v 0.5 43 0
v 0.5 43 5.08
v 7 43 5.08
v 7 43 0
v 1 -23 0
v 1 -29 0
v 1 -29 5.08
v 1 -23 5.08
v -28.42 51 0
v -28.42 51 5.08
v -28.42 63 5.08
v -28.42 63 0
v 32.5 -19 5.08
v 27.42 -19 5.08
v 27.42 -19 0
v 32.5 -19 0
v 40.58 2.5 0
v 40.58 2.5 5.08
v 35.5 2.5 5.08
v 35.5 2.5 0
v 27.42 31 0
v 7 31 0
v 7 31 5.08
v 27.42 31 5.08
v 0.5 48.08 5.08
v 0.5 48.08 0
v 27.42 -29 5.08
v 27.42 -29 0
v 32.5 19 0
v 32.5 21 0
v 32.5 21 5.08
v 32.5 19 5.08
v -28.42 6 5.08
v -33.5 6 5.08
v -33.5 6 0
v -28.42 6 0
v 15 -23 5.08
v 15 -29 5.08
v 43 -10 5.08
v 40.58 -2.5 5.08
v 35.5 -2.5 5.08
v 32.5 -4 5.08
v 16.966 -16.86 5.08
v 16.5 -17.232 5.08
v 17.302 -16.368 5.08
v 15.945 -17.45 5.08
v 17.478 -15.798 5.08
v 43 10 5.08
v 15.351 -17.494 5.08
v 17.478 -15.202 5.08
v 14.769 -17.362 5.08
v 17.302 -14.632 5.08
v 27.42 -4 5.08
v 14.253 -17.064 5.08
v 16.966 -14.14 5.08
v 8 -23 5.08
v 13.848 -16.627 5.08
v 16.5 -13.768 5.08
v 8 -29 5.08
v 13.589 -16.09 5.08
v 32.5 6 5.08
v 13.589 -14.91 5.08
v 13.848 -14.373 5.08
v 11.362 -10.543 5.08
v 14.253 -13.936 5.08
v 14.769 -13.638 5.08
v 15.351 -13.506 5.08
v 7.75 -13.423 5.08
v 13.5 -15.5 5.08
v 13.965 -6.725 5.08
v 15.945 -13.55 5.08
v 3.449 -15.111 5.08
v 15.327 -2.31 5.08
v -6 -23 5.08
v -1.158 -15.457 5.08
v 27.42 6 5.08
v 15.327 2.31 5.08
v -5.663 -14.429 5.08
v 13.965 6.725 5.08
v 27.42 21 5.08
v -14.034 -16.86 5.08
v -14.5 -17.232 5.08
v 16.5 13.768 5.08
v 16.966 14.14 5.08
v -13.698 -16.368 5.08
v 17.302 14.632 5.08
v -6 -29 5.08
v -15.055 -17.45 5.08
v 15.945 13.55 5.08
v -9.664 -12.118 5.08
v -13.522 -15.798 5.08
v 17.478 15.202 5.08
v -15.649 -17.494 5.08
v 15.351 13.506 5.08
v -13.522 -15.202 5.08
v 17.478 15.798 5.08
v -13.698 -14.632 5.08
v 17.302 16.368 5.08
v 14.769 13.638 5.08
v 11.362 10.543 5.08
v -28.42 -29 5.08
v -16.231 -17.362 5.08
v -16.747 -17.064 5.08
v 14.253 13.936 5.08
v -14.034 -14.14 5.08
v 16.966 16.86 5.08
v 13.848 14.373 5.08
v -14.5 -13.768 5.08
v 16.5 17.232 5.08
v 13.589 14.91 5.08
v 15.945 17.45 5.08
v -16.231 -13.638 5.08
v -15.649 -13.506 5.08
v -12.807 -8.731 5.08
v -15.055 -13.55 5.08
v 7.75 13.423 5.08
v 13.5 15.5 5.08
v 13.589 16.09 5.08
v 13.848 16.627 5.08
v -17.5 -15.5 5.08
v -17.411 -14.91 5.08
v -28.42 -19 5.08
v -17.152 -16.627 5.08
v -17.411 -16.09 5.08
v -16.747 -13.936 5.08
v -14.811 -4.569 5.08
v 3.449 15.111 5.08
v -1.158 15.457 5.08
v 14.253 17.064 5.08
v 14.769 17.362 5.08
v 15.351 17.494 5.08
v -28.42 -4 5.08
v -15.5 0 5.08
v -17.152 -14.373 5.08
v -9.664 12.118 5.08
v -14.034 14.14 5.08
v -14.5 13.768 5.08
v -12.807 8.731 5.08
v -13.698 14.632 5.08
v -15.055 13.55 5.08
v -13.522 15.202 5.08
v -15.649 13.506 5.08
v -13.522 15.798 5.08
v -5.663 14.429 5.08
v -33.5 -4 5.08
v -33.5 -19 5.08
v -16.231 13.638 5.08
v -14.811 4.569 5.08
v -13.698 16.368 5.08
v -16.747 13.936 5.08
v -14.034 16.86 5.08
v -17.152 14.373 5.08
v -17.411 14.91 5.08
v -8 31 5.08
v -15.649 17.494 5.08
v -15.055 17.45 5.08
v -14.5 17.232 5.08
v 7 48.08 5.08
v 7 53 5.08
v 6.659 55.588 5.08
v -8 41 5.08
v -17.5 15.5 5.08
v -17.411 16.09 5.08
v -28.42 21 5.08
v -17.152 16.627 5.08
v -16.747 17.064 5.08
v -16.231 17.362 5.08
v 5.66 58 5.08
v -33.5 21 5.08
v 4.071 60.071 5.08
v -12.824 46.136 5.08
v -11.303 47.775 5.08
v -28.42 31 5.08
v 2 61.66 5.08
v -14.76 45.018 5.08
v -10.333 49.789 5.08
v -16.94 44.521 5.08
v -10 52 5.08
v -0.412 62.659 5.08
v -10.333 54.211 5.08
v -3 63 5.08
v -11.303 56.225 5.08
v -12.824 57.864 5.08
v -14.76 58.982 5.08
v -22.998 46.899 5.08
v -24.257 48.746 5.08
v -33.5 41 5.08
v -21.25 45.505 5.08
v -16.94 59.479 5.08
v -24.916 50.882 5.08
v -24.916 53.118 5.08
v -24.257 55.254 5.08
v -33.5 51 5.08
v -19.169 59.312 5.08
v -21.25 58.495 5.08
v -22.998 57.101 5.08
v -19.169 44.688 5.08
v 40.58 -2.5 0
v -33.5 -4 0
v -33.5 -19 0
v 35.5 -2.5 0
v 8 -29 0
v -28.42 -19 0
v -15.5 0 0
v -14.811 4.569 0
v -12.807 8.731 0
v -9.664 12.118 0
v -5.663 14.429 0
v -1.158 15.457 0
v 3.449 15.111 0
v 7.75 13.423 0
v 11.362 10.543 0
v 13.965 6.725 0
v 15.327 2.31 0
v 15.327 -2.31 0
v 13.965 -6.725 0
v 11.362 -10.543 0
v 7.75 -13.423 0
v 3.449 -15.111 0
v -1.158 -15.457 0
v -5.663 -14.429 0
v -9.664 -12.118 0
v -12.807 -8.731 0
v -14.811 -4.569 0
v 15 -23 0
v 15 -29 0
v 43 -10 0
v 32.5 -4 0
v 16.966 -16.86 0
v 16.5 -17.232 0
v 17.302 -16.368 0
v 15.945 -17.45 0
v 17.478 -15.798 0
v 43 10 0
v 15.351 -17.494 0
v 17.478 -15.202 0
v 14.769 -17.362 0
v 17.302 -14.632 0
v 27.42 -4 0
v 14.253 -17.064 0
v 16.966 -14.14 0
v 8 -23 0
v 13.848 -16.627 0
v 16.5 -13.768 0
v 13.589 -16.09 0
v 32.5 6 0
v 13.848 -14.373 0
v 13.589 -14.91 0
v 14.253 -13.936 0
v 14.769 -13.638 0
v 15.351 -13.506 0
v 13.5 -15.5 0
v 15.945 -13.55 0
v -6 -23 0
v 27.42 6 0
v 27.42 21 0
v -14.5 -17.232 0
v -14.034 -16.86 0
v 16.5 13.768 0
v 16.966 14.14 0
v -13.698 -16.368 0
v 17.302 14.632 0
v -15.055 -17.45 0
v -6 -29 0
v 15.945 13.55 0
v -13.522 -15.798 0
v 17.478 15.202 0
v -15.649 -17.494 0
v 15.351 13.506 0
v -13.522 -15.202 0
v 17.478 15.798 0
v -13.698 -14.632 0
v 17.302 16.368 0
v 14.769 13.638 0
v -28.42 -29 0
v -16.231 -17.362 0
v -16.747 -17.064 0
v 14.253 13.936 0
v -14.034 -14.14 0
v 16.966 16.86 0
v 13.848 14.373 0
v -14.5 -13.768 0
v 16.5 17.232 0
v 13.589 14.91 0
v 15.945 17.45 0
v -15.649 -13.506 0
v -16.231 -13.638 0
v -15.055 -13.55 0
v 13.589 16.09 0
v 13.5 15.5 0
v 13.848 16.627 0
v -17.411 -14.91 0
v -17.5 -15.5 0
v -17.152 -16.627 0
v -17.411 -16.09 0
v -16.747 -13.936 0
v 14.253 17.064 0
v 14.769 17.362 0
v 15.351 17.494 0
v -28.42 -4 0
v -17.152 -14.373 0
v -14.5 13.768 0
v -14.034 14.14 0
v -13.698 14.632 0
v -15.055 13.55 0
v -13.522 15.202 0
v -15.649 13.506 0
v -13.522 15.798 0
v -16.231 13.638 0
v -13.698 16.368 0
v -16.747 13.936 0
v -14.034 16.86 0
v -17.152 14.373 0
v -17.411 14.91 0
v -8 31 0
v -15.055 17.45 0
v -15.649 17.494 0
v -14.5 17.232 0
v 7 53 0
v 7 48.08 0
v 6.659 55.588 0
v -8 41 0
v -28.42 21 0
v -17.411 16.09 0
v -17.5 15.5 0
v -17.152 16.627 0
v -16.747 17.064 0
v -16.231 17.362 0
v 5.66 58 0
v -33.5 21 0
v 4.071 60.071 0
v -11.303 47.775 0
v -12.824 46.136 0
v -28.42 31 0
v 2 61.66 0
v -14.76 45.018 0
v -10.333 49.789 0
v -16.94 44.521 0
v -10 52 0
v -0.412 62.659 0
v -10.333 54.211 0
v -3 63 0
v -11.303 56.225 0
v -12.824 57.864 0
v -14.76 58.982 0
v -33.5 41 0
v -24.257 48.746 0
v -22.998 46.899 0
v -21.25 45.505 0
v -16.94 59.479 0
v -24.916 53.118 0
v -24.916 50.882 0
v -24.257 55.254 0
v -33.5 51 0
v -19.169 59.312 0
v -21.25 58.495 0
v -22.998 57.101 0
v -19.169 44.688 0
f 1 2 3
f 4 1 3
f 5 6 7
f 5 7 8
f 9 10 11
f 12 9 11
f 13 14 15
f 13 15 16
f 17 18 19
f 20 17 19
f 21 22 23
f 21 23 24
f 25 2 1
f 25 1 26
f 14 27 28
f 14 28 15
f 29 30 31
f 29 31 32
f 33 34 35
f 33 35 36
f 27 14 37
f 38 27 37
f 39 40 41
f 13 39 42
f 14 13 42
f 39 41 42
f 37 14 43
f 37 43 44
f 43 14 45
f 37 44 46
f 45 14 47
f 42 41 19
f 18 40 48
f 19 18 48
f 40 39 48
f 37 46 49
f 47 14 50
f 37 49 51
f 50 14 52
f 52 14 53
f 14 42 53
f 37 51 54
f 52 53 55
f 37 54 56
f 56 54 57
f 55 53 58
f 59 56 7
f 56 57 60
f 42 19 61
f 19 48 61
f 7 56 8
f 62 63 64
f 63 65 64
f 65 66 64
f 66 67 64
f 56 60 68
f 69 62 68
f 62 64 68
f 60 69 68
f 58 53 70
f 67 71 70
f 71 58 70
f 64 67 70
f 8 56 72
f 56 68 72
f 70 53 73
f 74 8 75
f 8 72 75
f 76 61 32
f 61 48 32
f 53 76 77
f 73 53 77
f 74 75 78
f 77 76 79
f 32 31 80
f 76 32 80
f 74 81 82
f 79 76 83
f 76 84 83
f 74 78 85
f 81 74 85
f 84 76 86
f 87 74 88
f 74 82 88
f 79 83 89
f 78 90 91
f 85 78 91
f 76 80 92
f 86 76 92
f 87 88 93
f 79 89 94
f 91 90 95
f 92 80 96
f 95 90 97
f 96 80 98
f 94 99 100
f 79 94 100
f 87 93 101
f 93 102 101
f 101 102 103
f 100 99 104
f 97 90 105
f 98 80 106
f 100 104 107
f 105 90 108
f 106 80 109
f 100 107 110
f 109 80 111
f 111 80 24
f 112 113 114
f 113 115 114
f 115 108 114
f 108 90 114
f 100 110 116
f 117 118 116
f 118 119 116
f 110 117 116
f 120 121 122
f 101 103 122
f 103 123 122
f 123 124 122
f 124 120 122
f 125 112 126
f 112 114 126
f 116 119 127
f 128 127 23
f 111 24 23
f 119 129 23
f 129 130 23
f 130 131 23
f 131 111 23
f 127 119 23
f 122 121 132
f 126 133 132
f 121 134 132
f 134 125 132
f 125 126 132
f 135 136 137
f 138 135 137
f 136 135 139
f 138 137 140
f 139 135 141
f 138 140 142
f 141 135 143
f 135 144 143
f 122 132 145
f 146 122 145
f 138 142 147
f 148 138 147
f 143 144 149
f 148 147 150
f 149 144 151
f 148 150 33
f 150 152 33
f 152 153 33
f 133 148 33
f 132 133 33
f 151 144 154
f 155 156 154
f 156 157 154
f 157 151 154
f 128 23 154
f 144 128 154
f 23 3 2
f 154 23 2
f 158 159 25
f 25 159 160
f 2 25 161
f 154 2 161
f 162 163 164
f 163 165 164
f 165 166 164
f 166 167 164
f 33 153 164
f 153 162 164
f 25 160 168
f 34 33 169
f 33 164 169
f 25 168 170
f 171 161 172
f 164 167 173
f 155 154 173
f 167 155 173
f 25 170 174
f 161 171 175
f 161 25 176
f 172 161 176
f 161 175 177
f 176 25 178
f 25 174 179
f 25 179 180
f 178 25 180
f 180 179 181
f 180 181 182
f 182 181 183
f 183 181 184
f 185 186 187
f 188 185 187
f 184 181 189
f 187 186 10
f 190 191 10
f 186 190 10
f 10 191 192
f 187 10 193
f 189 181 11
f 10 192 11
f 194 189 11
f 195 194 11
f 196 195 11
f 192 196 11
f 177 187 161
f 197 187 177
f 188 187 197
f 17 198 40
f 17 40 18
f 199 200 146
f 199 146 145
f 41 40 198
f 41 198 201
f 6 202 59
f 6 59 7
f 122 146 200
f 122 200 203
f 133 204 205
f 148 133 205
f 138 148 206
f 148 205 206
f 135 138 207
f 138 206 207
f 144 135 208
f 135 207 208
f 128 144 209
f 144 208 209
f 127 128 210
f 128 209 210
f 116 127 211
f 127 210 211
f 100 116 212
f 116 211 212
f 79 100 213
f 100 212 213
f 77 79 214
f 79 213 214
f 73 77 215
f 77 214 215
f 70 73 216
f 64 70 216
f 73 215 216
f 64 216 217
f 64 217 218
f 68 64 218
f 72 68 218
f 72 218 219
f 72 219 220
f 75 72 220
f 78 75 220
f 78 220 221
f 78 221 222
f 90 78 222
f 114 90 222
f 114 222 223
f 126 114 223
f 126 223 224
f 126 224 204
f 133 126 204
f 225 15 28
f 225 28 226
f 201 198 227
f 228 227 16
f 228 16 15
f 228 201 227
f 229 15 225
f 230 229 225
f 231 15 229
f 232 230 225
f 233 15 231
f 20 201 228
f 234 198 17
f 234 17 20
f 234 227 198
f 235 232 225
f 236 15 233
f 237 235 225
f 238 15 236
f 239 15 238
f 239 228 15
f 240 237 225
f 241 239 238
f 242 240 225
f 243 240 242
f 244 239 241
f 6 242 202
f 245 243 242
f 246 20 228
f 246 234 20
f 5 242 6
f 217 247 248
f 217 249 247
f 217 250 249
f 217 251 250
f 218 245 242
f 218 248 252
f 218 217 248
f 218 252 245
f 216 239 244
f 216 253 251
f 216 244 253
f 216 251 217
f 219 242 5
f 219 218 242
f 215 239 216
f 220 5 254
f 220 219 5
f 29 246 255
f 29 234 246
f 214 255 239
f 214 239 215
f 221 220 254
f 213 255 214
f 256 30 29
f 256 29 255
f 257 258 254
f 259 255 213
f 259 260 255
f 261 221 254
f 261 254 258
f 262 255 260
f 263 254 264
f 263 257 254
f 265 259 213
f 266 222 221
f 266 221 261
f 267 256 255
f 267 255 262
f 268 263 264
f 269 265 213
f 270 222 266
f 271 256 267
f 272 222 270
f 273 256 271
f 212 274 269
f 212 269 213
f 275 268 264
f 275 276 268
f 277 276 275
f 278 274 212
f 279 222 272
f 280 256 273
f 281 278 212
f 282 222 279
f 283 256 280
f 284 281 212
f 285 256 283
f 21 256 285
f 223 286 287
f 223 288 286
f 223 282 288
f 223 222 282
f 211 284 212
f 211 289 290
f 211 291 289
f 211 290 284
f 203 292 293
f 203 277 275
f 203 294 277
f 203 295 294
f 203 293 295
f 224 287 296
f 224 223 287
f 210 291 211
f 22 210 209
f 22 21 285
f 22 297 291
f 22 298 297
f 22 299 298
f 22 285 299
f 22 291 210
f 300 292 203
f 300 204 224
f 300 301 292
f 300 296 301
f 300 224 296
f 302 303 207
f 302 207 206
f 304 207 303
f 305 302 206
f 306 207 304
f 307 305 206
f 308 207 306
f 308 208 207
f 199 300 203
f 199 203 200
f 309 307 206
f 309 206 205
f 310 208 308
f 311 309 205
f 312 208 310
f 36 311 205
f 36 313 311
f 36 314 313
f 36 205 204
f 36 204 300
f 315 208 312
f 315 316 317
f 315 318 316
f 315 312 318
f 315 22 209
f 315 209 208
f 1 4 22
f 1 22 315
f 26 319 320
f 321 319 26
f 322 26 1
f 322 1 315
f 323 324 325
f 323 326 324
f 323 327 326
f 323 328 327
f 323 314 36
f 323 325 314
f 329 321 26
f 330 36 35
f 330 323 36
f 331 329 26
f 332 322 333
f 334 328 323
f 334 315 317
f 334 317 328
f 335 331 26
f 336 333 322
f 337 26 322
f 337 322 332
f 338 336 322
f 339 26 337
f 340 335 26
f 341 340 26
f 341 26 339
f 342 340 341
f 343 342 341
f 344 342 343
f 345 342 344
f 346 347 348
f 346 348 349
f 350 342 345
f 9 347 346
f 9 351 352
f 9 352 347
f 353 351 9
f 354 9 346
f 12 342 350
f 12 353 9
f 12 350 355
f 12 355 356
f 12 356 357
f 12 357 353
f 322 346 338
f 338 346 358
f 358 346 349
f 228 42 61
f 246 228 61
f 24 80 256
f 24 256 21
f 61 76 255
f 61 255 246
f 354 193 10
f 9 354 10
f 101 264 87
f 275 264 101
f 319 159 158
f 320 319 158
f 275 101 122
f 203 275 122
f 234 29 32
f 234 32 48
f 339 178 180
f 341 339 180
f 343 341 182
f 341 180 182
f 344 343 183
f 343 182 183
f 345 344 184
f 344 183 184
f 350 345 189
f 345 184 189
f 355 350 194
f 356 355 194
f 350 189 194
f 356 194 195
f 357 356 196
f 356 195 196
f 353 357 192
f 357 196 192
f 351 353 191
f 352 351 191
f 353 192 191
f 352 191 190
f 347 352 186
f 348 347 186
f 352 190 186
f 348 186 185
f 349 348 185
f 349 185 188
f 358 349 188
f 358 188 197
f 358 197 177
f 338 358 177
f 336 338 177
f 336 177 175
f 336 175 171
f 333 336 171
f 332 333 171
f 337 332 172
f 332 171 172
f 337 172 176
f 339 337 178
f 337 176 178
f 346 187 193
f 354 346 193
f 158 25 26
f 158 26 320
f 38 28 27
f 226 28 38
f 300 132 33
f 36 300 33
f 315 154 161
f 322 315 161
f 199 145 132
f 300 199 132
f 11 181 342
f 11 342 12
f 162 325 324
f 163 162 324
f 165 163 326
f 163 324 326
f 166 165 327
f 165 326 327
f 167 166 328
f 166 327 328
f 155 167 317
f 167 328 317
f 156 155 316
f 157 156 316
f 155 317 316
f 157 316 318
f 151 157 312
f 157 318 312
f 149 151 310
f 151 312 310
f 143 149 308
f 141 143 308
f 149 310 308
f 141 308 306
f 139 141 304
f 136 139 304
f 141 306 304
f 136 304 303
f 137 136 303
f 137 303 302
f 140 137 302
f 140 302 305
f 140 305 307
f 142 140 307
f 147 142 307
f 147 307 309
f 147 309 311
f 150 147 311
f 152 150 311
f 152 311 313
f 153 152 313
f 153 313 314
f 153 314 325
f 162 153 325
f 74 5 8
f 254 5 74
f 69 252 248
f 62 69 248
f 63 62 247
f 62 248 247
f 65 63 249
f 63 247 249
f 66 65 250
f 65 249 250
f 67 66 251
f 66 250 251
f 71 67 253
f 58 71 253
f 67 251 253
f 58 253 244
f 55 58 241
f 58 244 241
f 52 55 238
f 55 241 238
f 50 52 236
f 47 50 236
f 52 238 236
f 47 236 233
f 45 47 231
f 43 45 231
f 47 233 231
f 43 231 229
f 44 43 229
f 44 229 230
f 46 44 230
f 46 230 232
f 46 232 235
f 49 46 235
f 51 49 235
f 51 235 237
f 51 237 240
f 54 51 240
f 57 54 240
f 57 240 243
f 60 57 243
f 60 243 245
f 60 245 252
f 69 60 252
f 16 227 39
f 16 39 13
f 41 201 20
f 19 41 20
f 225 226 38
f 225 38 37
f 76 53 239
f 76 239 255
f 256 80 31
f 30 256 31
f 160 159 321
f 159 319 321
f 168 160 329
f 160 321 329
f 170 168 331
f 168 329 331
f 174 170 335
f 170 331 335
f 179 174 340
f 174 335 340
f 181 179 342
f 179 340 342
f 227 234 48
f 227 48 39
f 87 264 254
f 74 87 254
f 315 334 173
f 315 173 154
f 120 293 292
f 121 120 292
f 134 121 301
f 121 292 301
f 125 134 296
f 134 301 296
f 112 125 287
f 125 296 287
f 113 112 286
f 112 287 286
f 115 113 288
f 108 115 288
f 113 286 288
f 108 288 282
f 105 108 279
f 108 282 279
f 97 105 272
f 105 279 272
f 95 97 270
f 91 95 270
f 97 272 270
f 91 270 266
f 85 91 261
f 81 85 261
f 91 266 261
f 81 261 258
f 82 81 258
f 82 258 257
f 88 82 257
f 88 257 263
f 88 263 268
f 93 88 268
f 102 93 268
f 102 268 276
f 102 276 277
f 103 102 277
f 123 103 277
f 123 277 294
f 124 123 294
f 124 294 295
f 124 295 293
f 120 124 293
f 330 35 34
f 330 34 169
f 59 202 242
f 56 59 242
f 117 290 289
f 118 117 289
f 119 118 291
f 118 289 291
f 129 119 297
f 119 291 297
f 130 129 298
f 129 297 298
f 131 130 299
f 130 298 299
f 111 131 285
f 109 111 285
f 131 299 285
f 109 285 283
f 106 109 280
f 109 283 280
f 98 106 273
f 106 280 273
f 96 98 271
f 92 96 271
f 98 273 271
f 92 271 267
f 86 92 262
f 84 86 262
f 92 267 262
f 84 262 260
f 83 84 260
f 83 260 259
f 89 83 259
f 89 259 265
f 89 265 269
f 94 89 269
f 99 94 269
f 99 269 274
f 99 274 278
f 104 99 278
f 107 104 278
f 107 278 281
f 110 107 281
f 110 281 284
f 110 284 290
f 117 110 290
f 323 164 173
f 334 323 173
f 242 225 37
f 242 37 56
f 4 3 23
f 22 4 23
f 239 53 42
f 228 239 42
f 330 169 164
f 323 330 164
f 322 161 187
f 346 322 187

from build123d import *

# Parameters (mm, degrees)
BOSS_EXTRUDE1_DEPTH = 5.08
SKETCH2_R           = 15.5
SKETCH2_R_2         = 2
SKETCH2_W           = 7
SKETCH2_H           = 6
SKETCH2_W_2         = 5.08
SKETCH2_H_2         = 5
CUT_EXTRUDE1_DEPTH  = 6.08
SKETCH4_W           = 5.08
SKETCH4_H           = 10
CUT_EXTRUDE2_DEPTH  = 6.08
SKETCH5_R           = 7.5
BOSS_EXTRUDE2_DEPTH = 5.08
SKETCH6_W           = 5.08
SKETCH6_H           = 12
SKETCH6_W_2         = 8
SKETCH6_H_2         = 5.08
CUT_EXTRUDE3_DEPTH  = 6.08
FILLET1_R           = 10


with BuildPart() as part:
    # Sketch1 → Boss-Extrude1 (new body)
    with BuildSketch(Plane.XY):
        Polygon((32.5, 19), (43, 10), (43, -10), (32.5, -19), (32.5, -29), (-33.5, -29), (-33.5, 31), (32.5, 31), align=None)
    extrude(amount=BOSS_EXTRUDE1_DEPTH)

    # Sketch2 → Cut-Extrude1 (cut, through all)
    with BuildSketch(Plane(origin=(0, 0, 0), x_dir=(-1, 0, 0), z_dir=(0, 0, -1))):
        Circle(SKETCH2_R)
        with Locations((15.5, -15.5)):
            Circle(SKETCH2_R_2)
        with Locations((-15.5, -15.5)):
            Circle(SKETCH2_R_2)
        with Locations((-15.5, 15.5)):
            Circle(SKETCH2_R_2)
        with Locations((15.5, 15.5)):
            Circle(SKETCH2_R_2)
        with Locations((-11.5, -26)):
            Rectangle(SKETCH2_W, SKETCH2_H)
        with Locations((2.5, -26)):
            Rectangle(SKETCH2_W, SKETCH2_H)
        with Locations((-38.04, 0)):
            Rectangle(SKETCH2_W_2, SKETCH2_H_2)
    extrude(amount=-CUT_EXTRUDE1_DEPTH, mode=Mode.SUBTRACT)

    # Sketch4 → Cut-Extrude2 (cut, through all)
    with BuildSketch(Plane.XY.offset(5.08)):
        with Locations((29.96, 1)):
            Rectangle(SKETCH4_W, SKETCH4_H)
        with Locations((29.96, -24)):
            Rectangle(SKETCH4_W, SKETCH4_H)
        with Locations((29.96, 26)):
            Rectangle(SKETCH4_W, SKETCH4_H)
        with Locations((-30.96, -24)):
            Rectangle(SKETCH4_W, SKETCH4_H)
        with Locations((-30.96, 1)):
            Rectangle(SKETCH4_W, SKETCH4_H)
        with Locations((-30.96, 26)):
            Rectangle(SKETCH4_W, SKETCH4_H)
    extrude(amount=-CUT_EXTRUDE2_DEPTH, mode=Mode.SUBTRACT)

    # Sketch5 → Boss-Extrude2 (add)
    with BuildSketch(Plane.XY.offset(5.08)):
        Polygon((-8, 63), (7, 63), (7, 31), (-8, 31), (-8, 41), (-33.5, 41), (-33.5, 63), align=None)
        with Locations((-17.5, 52)):
            Circle(SKETCH5_R, mode=Mode.SUBTRACT)
    extrude(amount=-BOSS_EXTRUDE2_DEPTH)

    # Sketch6 → Cut-Extrude3 (cut, through all)
    with BuildSketch(Plane.XY.offset(5.08)):
        with Locations((-30.96, 57)):
            Rectangle(SKETCH6_W, SKETCH6_H)
        with Locations((4.5, 45.54)):
            Rectangle(SKETCH6_W_2, SKETCH6_H_2)
    extrude(amount=-CUT_EXTRUDE3_DEPTH, mode=Mode.SUBTRACT)

    # Fillet1
    fillet1_edges = [part.edges().sort_by_distance(p)[0] for p in [
        (7, 63, 2.54),
    ]]
    fillet(fillet1_edges, radius=FILLET1_R)


solid = part.part
